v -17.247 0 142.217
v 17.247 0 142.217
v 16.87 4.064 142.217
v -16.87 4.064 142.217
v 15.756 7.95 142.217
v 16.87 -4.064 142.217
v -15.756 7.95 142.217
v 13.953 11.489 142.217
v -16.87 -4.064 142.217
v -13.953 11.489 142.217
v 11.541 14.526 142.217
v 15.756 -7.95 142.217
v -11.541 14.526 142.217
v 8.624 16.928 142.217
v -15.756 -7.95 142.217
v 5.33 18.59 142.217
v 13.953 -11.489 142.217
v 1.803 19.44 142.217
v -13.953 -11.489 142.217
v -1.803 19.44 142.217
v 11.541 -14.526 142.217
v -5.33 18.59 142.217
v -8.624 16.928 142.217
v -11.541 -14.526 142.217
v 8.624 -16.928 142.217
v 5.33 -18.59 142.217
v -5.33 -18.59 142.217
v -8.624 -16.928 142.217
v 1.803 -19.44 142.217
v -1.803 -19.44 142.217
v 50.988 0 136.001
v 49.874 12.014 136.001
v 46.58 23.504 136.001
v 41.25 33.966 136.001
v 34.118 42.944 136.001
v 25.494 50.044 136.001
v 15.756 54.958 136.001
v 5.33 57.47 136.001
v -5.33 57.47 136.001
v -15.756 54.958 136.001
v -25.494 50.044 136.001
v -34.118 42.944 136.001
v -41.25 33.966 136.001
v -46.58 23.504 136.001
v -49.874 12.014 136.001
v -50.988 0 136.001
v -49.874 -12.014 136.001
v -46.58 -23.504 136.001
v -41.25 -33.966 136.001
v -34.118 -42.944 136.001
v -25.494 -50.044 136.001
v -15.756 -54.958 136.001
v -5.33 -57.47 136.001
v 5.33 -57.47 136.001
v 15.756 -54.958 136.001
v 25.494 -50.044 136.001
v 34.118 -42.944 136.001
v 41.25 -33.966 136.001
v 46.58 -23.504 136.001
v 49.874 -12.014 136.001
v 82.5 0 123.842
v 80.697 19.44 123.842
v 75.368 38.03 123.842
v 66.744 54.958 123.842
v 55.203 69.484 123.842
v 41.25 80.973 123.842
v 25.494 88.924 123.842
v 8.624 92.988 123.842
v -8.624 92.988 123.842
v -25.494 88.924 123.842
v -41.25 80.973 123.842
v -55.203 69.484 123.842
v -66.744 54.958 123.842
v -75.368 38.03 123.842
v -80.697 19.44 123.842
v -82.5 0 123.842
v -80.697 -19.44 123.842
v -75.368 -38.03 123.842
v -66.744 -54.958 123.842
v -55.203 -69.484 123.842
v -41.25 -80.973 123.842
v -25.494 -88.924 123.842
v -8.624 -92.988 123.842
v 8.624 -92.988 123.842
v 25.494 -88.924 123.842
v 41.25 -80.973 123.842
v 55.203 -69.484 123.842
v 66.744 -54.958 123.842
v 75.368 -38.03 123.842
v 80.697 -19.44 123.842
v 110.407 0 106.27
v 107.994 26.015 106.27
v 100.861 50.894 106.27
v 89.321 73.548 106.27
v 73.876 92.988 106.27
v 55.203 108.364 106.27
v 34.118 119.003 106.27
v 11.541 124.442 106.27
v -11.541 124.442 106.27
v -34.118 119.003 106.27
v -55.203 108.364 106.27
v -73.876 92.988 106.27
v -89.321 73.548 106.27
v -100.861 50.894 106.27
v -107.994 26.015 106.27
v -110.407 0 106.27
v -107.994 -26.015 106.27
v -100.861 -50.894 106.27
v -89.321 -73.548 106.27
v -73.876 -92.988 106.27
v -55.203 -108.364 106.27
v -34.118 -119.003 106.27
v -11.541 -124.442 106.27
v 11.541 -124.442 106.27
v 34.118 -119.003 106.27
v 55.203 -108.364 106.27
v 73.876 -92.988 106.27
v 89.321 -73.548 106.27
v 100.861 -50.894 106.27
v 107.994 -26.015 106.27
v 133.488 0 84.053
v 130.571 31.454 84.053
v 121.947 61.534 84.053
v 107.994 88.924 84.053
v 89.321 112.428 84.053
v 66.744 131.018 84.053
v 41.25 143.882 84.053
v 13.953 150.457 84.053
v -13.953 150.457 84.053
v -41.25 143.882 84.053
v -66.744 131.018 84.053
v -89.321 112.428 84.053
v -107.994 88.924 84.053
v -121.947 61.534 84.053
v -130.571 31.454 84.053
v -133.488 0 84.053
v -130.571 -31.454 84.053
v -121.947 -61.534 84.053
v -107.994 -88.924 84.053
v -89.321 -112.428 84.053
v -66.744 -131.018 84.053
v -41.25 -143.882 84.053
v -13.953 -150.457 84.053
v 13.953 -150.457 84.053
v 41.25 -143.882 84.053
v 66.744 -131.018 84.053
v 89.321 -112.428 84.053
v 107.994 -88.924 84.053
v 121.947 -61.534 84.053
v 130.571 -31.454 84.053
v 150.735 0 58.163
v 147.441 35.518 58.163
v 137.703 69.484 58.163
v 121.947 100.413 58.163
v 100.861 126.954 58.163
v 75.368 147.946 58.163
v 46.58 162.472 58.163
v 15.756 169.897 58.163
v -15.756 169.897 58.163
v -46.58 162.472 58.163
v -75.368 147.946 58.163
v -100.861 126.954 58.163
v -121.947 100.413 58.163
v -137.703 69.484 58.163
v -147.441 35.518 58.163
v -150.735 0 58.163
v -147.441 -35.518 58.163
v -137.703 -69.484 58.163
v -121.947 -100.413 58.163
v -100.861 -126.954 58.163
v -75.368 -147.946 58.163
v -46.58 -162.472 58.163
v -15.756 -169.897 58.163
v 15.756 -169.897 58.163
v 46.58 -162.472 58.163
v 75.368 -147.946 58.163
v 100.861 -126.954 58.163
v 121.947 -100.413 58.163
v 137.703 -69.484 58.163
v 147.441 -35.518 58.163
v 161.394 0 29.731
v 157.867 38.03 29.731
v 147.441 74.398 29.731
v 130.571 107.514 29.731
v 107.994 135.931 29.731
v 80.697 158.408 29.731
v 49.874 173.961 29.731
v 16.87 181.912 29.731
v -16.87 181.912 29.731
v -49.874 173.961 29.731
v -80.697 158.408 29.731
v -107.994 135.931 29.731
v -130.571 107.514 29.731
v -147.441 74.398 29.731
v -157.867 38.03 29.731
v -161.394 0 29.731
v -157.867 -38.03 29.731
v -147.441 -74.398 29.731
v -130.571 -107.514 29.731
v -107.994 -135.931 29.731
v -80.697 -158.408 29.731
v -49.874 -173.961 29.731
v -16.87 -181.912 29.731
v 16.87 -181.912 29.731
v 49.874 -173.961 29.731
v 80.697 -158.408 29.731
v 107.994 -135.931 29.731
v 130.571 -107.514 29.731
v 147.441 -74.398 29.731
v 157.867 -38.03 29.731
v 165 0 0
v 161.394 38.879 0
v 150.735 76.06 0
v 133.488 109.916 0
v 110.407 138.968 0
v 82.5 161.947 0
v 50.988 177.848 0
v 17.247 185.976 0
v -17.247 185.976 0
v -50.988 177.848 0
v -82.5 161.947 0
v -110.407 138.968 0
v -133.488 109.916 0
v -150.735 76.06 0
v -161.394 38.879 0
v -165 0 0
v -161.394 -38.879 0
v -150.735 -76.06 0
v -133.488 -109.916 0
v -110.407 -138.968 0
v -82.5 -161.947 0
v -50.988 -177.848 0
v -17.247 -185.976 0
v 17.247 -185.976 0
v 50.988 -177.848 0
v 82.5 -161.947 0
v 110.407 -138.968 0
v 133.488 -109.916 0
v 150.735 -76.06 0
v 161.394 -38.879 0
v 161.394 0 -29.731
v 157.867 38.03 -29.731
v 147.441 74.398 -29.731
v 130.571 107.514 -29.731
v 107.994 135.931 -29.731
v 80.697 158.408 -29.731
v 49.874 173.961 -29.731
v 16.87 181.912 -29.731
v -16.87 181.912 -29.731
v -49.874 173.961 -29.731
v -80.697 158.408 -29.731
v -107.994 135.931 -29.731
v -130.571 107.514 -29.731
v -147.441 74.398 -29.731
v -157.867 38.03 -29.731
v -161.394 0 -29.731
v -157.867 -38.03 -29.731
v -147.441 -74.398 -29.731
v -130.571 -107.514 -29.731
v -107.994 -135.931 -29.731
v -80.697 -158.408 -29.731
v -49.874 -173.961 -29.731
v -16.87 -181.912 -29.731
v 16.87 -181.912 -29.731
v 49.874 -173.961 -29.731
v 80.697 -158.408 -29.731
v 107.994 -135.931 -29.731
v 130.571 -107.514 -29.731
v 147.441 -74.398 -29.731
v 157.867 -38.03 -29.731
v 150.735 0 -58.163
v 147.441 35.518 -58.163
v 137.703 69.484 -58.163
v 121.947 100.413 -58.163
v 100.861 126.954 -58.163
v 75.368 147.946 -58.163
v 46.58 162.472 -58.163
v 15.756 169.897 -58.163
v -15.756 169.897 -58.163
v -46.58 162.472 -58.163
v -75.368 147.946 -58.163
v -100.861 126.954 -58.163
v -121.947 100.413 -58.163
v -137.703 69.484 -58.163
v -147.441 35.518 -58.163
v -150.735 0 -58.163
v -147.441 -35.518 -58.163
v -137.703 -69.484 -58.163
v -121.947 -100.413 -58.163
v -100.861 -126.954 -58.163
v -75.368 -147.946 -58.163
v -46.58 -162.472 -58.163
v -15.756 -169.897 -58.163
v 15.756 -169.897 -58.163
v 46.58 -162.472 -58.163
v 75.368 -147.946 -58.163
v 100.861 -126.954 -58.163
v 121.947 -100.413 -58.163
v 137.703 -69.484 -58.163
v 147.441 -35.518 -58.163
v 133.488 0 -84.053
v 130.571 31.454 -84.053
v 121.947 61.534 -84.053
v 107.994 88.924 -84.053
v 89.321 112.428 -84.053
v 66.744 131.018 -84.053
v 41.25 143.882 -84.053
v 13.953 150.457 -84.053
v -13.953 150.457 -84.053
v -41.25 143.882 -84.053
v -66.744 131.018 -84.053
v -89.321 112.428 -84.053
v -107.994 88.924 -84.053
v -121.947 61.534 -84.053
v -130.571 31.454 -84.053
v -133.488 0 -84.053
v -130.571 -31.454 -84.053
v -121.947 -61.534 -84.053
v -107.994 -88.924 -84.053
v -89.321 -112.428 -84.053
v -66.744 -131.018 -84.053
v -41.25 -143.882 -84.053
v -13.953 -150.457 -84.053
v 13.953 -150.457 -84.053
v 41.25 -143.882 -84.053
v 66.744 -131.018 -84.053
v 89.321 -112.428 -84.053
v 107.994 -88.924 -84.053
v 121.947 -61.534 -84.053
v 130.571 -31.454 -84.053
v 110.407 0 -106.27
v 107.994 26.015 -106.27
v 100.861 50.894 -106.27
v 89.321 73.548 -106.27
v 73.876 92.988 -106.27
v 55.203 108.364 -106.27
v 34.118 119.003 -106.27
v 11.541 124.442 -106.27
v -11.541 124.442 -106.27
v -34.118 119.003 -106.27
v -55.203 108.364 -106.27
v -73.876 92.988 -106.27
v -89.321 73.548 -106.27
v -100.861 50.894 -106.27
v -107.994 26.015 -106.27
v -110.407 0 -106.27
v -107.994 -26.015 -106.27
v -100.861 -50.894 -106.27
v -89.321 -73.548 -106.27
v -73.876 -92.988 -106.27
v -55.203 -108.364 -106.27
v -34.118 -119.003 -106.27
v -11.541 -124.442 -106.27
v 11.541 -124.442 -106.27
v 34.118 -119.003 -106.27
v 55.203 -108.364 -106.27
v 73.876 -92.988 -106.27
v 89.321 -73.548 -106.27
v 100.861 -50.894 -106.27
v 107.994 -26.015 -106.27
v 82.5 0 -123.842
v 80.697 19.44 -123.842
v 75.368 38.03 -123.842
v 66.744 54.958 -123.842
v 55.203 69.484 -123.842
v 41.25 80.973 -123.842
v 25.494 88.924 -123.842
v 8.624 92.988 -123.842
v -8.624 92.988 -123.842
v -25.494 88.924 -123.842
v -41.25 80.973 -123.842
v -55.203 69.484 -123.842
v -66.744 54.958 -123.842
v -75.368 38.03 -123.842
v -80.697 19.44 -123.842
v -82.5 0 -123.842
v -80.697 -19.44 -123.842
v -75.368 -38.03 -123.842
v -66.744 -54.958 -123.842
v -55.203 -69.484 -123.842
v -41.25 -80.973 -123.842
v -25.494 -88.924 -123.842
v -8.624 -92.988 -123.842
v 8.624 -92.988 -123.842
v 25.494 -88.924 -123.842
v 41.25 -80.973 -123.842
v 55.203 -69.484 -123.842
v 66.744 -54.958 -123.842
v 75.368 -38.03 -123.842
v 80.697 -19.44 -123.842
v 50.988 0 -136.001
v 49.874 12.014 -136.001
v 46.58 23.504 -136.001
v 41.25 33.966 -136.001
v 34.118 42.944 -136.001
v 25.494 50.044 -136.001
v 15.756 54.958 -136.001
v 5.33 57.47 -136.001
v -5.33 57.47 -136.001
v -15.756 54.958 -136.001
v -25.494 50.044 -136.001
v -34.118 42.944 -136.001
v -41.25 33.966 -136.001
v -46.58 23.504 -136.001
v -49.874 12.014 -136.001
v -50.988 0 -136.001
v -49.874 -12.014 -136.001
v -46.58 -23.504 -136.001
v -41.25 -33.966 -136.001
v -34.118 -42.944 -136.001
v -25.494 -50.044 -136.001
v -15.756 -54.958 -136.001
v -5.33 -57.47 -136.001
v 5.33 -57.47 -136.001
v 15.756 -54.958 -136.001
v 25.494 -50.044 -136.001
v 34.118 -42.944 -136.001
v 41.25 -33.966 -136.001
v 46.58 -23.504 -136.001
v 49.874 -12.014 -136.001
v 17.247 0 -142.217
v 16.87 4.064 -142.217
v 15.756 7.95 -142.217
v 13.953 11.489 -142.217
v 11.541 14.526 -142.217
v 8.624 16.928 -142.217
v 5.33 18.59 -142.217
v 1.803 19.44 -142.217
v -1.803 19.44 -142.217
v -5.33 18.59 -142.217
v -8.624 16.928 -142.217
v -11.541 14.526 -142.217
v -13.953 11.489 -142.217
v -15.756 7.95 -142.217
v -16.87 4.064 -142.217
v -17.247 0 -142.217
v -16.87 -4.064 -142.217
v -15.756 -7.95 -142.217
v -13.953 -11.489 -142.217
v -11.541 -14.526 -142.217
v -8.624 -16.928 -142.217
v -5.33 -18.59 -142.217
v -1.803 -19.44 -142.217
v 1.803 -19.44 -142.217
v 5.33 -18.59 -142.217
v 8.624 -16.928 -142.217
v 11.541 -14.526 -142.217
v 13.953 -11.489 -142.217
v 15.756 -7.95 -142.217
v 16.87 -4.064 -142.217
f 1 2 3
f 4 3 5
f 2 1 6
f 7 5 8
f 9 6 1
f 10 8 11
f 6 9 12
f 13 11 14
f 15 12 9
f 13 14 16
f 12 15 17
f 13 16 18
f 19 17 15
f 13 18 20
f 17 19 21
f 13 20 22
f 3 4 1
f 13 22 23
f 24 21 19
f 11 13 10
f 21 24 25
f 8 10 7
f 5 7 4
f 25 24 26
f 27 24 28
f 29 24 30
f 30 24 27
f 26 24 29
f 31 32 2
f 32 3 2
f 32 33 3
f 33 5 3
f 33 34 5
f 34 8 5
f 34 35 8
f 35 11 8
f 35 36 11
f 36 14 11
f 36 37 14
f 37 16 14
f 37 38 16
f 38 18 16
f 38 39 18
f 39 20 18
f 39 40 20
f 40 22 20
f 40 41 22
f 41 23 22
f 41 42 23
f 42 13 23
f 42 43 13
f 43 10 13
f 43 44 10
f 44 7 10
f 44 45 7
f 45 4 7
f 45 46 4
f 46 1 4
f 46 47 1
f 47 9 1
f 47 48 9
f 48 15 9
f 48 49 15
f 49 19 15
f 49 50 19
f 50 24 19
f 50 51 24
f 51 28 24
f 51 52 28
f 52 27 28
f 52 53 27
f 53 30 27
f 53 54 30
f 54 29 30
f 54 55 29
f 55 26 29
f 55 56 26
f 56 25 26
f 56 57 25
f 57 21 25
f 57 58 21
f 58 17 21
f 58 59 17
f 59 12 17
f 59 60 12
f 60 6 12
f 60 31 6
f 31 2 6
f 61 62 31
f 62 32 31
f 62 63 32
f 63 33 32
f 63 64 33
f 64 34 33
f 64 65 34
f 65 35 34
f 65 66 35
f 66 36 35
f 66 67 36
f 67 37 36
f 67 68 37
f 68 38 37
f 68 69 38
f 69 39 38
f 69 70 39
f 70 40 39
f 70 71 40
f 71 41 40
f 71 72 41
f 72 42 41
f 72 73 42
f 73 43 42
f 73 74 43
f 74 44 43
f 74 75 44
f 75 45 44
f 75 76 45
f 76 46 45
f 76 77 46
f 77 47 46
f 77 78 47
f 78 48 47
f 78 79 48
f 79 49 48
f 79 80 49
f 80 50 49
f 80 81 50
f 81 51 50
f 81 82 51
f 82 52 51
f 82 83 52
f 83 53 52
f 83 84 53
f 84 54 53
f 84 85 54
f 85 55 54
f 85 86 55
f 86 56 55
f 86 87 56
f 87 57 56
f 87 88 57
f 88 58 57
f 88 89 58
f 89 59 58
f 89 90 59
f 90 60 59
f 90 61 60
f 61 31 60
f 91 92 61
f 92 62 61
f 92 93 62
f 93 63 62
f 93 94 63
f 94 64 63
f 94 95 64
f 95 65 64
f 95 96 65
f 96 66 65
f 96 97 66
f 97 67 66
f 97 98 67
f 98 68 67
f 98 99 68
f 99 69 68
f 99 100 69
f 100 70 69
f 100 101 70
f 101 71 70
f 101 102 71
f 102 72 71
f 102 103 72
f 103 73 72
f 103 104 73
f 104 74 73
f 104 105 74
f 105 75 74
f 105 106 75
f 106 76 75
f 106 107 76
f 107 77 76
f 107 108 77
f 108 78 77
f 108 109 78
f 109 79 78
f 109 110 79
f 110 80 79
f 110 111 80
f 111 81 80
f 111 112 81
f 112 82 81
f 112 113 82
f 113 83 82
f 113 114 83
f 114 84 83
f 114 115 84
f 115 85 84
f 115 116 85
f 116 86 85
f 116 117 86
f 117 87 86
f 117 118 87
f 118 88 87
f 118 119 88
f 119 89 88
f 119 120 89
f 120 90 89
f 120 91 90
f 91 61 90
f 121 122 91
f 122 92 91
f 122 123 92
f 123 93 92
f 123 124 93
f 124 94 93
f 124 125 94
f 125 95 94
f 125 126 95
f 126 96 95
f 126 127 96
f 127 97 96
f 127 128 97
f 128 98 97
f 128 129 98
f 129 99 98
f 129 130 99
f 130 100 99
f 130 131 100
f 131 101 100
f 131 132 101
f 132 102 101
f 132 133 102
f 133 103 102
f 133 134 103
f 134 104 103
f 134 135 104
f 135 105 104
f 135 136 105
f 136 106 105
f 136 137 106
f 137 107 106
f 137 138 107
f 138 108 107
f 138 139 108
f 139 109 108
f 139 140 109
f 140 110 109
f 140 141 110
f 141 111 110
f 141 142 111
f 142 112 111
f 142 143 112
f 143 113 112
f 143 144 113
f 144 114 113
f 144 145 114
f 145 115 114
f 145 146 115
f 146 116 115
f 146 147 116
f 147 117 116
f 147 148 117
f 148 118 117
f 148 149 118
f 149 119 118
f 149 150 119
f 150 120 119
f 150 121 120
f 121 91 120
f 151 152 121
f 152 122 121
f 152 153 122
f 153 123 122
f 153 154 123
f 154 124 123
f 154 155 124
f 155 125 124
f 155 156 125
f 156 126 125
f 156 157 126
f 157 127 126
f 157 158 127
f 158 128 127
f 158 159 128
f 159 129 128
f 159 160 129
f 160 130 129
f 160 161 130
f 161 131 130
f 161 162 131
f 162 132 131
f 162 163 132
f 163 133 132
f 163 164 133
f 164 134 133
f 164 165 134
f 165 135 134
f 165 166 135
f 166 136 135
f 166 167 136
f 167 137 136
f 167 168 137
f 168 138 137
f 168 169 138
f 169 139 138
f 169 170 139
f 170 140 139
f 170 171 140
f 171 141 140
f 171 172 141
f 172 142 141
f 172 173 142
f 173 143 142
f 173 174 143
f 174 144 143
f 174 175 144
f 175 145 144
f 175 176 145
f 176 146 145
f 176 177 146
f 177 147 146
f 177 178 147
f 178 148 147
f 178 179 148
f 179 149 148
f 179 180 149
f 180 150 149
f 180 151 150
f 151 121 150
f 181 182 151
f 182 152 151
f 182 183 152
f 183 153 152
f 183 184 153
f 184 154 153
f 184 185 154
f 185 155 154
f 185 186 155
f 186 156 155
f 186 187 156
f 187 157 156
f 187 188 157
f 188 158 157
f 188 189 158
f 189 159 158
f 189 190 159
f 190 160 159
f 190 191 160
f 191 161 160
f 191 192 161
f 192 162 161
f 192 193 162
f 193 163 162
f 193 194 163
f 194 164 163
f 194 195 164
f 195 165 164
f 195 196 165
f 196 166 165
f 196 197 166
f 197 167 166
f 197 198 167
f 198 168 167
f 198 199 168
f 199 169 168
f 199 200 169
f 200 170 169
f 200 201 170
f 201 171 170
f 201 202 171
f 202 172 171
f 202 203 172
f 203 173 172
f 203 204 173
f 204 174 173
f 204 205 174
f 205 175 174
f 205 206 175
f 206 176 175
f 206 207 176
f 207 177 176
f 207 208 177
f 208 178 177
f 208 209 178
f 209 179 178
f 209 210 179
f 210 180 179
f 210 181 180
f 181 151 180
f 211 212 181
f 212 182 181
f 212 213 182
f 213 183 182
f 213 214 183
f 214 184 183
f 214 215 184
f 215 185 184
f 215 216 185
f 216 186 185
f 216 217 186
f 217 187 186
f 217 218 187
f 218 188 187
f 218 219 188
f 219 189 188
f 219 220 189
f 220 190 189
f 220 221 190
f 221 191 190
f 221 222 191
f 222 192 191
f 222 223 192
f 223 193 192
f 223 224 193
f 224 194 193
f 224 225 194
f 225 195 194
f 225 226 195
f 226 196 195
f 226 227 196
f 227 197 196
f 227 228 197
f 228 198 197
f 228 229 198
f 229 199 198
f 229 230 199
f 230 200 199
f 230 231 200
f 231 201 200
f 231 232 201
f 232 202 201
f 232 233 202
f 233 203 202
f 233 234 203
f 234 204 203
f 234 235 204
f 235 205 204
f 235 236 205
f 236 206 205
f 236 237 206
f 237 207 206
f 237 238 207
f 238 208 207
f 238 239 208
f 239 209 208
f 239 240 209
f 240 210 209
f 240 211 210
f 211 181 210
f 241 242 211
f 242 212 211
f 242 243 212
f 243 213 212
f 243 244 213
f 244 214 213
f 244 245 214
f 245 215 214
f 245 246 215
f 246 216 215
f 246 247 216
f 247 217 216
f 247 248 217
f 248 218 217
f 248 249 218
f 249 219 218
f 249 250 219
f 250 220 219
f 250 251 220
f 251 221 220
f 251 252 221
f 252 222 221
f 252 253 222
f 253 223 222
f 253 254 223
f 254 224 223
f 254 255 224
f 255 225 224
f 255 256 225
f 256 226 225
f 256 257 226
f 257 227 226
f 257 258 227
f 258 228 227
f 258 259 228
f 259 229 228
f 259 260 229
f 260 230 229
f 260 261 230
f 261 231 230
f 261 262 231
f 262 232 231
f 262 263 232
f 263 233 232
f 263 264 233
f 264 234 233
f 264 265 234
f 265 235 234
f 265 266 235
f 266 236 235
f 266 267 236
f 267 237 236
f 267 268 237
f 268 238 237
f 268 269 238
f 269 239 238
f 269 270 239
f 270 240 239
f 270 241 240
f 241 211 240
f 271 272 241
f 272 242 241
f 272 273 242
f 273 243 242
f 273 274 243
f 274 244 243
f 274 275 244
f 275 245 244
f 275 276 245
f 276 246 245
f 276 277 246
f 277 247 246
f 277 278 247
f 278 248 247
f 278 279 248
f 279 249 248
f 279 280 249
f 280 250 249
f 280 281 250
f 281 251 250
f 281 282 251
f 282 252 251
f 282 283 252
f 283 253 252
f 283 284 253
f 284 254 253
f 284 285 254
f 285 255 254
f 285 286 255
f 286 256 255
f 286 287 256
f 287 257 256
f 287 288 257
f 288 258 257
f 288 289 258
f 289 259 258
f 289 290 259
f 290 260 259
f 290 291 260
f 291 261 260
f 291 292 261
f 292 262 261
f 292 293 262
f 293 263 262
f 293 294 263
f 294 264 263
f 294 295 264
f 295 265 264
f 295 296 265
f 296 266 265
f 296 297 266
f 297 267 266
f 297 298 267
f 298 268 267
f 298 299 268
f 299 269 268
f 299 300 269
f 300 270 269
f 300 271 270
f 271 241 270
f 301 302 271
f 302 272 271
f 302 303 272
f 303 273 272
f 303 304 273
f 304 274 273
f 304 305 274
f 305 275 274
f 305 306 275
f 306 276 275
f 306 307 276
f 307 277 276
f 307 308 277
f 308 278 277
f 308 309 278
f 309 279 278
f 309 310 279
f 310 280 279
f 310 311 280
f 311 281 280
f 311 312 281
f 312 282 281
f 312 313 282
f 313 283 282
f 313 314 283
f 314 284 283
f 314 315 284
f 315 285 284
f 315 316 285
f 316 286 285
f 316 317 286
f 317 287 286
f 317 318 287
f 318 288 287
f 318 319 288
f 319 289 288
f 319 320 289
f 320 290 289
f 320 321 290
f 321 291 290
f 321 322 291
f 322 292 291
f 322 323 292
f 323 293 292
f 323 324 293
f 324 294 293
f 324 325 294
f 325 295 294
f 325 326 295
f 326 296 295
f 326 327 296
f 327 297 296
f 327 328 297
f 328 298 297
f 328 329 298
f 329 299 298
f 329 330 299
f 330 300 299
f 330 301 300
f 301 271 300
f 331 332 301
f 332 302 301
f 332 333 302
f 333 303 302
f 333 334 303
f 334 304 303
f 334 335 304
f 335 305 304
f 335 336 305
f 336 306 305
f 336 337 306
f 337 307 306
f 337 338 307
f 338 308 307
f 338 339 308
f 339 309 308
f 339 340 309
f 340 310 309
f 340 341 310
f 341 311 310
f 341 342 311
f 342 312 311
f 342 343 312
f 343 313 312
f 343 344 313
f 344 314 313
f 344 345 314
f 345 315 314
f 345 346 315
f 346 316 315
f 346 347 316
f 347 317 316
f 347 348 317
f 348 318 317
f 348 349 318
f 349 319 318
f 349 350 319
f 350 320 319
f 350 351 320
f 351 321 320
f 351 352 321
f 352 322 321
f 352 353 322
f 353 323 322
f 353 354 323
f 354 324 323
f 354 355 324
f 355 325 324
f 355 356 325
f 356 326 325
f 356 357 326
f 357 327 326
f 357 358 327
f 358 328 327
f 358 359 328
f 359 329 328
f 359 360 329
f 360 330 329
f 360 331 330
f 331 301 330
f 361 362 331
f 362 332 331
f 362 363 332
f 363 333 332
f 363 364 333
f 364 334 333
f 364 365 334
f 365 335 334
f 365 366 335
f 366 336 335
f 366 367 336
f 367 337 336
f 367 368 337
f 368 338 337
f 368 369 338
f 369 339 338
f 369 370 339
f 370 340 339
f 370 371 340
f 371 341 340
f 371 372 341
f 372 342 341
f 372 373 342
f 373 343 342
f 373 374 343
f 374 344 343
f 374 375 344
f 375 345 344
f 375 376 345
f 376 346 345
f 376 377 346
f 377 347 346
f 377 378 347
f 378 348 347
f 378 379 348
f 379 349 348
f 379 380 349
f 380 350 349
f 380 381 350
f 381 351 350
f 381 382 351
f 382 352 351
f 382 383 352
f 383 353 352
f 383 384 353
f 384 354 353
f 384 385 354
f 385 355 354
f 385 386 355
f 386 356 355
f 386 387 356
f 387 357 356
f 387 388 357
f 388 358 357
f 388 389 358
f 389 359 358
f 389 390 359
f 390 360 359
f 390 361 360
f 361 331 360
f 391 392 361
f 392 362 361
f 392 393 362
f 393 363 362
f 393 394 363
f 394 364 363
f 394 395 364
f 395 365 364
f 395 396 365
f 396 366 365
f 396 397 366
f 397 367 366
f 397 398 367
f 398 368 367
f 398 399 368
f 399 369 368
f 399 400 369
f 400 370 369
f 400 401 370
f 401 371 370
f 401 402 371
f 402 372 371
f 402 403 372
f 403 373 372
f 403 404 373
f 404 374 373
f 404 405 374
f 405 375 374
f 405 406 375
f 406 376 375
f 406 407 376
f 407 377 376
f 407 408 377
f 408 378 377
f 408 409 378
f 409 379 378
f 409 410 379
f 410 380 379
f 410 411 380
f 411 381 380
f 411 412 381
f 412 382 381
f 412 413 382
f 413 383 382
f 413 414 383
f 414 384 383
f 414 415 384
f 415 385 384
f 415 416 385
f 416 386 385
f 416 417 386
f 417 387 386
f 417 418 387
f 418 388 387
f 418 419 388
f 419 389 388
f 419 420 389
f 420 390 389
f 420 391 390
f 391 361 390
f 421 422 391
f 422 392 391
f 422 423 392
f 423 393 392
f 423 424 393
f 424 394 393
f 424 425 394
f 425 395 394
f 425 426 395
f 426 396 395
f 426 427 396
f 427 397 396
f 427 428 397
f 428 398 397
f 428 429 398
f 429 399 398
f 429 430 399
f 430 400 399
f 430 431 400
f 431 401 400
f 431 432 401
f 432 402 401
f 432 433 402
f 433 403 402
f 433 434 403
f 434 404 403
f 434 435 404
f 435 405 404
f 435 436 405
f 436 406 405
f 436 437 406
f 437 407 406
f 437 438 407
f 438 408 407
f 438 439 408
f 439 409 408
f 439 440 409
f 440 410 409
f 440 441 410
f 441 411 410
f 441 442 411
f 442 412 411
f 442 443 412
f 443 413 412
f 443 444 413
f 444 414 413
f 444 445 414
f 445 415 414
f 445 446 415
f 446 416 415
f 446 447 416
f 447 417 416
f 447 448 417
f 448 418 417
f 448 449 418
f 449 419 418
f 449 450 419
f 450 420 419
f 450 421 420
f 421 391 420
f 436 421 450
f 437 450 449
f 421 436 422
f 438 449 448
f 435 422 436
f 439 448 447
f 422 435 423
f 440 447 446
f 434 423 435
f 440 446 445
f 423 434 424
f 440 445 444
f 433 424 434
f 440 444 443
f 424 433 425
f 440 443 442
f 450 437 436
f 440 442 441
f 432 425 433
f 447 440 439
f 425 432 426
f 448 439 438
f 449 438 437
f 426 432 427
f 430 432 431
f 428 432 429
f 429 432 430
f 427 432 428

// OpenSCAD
// Generated by SolidPython 1.0.1 on 2020-07-29 00:46:52


scale(v = [15, 17, 13]) {
	sphere(r = 11);
}
/***********************************************
*********      SolidPython code:      **********
************************************************
 
# import packages: SolidPython
from solid import *
from solid.utils import *
from itertools import chain, combinations, permutations


class Resize:

    def __init__(self, scad_file):
        self.scad_file = scad_file
        #self.scad_file = import_scad(scad_file)
        # cone/cylinder param:
        self.r1 = 0
        self.r2 = 0
        self.h = 0
        # rectangular prism param:
        self.w = 0
        self.l = 0
        # ellipse param:
        self.r = 0

    # import OpenScad code (file name corresponds to shape)


    # classify shape + parameters
    def assign(self, param1, param2, param3):
        if self.scad_file == 'cone.scad':
            self.r1 = param1
            self.r2 = param2
            self.h = param3
        elif self.scad_file == 'cylinder.scad':
            self.r1 = param1
            self.r2 = param2
            self.h = param3
        elif self.scad_file == 'rectangularPrism.scad':
            self.h = param1
            self.l = param2
            self.w = param3
        else:
            self.r = param1
            self.h = param2

    # resize parameters
    def iterate(self):
        x = range(3, 20, 2)
        i = 1
        if self.scad_file == 'cone.scad':
            tempList = list(permutations(x, 2))
            for temp in tempList:
                param1 = temp[0]
                param2 = temp[1]
                filepath = 'produced_scad_files/' + 'cone' + str(param1) + '_' + str(param2) + '_' + '.scad'
                scad_render_to_file(cylinder(h=param1, r1=param2, r2=0), filepath)

        elif self.scad_file == 'cylinder.scad':
            tempList = list(permutations(x, 3))
            for temp in tempList:
                param1 = temp[0]
                param2 = temp[1]
                filepath = 'produced_scad_files/' + 'cylinder' + str(param1) + '_' + str(param2) + '_' + '.scad'
                scad_render_to_file(cylinder(h=param1, r1=param2, r2=param2), filepath)

        elif self.scad_file == 'rectangularPrism.scad':
            tempList = list(permutations(x, 3))
            for temp in tempList:
                param1 = temp[0]
                param2 = temp[1]
                param3 = temp[2]
                filepath = 'produced_scad_files/' + 'rectangularPrism' + str(param1) + '_' + str(param2) + '_' + str(
                    param3) + '.scad'
                scad_render_to_file(cube(size=(param1, param2, param3)), filepath)

        elif self.scad_file == 'ellipse.scad':
            tempList = list(permutations(x, 4))
            for temp in tempList:
                param1 = temp[0]
                param2 = temp[1]
                param3 = temp[2]
                param4 = temp[3]
                filepath = 'produced_scad_files/' + 'ellipse' + str(param1) + '_' + str(param2) + '_' + str(param3) + '_' + str(param4) + '.scad'
                scad_render_to_file(scale([param1, param2, param3])(sphere(r=param4)), filepath)

    def render_to_scadfile(self):
        scad_render_to_file(scad, 'example.scad') 
 
************************************************/
